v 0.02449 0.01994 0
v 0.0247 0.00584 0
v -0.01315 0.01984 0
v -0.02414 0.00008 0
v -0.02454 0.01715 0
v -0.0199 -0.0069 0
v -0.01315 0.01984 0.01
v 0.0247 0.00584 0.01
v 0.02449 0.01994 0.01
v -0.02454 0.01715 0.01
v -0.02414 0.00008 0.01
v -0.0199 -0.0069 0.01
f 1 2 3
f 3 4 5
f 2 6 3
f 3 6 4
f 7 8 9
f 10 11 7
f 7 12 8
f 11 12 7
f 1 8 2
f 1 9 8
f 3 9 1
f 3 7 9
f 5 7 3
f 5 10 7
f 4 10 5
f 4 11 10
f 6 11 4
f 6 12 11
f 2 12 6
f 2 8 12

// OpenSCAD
                        p1 = [0.024714122445207556, 0.005856151862934991];
                        p2 = [0.024497204174517076, 0.019948254100679342];
                        p3 = [-0.013153861690080176, 0.019840952092155226];
                        p4 = [-0.024550563711868964, 0.01715471649157126];
                        p5 = [-0.02415322817041728, 8.51811347042479e-05];
                        p6 = [-0.019911915049509128, -0.006912079789447412];
                        points = [p1, p2, p3, p4, p5, p6];
                        linear_extrude(height=0.01)
                        polygon(points);
                        
